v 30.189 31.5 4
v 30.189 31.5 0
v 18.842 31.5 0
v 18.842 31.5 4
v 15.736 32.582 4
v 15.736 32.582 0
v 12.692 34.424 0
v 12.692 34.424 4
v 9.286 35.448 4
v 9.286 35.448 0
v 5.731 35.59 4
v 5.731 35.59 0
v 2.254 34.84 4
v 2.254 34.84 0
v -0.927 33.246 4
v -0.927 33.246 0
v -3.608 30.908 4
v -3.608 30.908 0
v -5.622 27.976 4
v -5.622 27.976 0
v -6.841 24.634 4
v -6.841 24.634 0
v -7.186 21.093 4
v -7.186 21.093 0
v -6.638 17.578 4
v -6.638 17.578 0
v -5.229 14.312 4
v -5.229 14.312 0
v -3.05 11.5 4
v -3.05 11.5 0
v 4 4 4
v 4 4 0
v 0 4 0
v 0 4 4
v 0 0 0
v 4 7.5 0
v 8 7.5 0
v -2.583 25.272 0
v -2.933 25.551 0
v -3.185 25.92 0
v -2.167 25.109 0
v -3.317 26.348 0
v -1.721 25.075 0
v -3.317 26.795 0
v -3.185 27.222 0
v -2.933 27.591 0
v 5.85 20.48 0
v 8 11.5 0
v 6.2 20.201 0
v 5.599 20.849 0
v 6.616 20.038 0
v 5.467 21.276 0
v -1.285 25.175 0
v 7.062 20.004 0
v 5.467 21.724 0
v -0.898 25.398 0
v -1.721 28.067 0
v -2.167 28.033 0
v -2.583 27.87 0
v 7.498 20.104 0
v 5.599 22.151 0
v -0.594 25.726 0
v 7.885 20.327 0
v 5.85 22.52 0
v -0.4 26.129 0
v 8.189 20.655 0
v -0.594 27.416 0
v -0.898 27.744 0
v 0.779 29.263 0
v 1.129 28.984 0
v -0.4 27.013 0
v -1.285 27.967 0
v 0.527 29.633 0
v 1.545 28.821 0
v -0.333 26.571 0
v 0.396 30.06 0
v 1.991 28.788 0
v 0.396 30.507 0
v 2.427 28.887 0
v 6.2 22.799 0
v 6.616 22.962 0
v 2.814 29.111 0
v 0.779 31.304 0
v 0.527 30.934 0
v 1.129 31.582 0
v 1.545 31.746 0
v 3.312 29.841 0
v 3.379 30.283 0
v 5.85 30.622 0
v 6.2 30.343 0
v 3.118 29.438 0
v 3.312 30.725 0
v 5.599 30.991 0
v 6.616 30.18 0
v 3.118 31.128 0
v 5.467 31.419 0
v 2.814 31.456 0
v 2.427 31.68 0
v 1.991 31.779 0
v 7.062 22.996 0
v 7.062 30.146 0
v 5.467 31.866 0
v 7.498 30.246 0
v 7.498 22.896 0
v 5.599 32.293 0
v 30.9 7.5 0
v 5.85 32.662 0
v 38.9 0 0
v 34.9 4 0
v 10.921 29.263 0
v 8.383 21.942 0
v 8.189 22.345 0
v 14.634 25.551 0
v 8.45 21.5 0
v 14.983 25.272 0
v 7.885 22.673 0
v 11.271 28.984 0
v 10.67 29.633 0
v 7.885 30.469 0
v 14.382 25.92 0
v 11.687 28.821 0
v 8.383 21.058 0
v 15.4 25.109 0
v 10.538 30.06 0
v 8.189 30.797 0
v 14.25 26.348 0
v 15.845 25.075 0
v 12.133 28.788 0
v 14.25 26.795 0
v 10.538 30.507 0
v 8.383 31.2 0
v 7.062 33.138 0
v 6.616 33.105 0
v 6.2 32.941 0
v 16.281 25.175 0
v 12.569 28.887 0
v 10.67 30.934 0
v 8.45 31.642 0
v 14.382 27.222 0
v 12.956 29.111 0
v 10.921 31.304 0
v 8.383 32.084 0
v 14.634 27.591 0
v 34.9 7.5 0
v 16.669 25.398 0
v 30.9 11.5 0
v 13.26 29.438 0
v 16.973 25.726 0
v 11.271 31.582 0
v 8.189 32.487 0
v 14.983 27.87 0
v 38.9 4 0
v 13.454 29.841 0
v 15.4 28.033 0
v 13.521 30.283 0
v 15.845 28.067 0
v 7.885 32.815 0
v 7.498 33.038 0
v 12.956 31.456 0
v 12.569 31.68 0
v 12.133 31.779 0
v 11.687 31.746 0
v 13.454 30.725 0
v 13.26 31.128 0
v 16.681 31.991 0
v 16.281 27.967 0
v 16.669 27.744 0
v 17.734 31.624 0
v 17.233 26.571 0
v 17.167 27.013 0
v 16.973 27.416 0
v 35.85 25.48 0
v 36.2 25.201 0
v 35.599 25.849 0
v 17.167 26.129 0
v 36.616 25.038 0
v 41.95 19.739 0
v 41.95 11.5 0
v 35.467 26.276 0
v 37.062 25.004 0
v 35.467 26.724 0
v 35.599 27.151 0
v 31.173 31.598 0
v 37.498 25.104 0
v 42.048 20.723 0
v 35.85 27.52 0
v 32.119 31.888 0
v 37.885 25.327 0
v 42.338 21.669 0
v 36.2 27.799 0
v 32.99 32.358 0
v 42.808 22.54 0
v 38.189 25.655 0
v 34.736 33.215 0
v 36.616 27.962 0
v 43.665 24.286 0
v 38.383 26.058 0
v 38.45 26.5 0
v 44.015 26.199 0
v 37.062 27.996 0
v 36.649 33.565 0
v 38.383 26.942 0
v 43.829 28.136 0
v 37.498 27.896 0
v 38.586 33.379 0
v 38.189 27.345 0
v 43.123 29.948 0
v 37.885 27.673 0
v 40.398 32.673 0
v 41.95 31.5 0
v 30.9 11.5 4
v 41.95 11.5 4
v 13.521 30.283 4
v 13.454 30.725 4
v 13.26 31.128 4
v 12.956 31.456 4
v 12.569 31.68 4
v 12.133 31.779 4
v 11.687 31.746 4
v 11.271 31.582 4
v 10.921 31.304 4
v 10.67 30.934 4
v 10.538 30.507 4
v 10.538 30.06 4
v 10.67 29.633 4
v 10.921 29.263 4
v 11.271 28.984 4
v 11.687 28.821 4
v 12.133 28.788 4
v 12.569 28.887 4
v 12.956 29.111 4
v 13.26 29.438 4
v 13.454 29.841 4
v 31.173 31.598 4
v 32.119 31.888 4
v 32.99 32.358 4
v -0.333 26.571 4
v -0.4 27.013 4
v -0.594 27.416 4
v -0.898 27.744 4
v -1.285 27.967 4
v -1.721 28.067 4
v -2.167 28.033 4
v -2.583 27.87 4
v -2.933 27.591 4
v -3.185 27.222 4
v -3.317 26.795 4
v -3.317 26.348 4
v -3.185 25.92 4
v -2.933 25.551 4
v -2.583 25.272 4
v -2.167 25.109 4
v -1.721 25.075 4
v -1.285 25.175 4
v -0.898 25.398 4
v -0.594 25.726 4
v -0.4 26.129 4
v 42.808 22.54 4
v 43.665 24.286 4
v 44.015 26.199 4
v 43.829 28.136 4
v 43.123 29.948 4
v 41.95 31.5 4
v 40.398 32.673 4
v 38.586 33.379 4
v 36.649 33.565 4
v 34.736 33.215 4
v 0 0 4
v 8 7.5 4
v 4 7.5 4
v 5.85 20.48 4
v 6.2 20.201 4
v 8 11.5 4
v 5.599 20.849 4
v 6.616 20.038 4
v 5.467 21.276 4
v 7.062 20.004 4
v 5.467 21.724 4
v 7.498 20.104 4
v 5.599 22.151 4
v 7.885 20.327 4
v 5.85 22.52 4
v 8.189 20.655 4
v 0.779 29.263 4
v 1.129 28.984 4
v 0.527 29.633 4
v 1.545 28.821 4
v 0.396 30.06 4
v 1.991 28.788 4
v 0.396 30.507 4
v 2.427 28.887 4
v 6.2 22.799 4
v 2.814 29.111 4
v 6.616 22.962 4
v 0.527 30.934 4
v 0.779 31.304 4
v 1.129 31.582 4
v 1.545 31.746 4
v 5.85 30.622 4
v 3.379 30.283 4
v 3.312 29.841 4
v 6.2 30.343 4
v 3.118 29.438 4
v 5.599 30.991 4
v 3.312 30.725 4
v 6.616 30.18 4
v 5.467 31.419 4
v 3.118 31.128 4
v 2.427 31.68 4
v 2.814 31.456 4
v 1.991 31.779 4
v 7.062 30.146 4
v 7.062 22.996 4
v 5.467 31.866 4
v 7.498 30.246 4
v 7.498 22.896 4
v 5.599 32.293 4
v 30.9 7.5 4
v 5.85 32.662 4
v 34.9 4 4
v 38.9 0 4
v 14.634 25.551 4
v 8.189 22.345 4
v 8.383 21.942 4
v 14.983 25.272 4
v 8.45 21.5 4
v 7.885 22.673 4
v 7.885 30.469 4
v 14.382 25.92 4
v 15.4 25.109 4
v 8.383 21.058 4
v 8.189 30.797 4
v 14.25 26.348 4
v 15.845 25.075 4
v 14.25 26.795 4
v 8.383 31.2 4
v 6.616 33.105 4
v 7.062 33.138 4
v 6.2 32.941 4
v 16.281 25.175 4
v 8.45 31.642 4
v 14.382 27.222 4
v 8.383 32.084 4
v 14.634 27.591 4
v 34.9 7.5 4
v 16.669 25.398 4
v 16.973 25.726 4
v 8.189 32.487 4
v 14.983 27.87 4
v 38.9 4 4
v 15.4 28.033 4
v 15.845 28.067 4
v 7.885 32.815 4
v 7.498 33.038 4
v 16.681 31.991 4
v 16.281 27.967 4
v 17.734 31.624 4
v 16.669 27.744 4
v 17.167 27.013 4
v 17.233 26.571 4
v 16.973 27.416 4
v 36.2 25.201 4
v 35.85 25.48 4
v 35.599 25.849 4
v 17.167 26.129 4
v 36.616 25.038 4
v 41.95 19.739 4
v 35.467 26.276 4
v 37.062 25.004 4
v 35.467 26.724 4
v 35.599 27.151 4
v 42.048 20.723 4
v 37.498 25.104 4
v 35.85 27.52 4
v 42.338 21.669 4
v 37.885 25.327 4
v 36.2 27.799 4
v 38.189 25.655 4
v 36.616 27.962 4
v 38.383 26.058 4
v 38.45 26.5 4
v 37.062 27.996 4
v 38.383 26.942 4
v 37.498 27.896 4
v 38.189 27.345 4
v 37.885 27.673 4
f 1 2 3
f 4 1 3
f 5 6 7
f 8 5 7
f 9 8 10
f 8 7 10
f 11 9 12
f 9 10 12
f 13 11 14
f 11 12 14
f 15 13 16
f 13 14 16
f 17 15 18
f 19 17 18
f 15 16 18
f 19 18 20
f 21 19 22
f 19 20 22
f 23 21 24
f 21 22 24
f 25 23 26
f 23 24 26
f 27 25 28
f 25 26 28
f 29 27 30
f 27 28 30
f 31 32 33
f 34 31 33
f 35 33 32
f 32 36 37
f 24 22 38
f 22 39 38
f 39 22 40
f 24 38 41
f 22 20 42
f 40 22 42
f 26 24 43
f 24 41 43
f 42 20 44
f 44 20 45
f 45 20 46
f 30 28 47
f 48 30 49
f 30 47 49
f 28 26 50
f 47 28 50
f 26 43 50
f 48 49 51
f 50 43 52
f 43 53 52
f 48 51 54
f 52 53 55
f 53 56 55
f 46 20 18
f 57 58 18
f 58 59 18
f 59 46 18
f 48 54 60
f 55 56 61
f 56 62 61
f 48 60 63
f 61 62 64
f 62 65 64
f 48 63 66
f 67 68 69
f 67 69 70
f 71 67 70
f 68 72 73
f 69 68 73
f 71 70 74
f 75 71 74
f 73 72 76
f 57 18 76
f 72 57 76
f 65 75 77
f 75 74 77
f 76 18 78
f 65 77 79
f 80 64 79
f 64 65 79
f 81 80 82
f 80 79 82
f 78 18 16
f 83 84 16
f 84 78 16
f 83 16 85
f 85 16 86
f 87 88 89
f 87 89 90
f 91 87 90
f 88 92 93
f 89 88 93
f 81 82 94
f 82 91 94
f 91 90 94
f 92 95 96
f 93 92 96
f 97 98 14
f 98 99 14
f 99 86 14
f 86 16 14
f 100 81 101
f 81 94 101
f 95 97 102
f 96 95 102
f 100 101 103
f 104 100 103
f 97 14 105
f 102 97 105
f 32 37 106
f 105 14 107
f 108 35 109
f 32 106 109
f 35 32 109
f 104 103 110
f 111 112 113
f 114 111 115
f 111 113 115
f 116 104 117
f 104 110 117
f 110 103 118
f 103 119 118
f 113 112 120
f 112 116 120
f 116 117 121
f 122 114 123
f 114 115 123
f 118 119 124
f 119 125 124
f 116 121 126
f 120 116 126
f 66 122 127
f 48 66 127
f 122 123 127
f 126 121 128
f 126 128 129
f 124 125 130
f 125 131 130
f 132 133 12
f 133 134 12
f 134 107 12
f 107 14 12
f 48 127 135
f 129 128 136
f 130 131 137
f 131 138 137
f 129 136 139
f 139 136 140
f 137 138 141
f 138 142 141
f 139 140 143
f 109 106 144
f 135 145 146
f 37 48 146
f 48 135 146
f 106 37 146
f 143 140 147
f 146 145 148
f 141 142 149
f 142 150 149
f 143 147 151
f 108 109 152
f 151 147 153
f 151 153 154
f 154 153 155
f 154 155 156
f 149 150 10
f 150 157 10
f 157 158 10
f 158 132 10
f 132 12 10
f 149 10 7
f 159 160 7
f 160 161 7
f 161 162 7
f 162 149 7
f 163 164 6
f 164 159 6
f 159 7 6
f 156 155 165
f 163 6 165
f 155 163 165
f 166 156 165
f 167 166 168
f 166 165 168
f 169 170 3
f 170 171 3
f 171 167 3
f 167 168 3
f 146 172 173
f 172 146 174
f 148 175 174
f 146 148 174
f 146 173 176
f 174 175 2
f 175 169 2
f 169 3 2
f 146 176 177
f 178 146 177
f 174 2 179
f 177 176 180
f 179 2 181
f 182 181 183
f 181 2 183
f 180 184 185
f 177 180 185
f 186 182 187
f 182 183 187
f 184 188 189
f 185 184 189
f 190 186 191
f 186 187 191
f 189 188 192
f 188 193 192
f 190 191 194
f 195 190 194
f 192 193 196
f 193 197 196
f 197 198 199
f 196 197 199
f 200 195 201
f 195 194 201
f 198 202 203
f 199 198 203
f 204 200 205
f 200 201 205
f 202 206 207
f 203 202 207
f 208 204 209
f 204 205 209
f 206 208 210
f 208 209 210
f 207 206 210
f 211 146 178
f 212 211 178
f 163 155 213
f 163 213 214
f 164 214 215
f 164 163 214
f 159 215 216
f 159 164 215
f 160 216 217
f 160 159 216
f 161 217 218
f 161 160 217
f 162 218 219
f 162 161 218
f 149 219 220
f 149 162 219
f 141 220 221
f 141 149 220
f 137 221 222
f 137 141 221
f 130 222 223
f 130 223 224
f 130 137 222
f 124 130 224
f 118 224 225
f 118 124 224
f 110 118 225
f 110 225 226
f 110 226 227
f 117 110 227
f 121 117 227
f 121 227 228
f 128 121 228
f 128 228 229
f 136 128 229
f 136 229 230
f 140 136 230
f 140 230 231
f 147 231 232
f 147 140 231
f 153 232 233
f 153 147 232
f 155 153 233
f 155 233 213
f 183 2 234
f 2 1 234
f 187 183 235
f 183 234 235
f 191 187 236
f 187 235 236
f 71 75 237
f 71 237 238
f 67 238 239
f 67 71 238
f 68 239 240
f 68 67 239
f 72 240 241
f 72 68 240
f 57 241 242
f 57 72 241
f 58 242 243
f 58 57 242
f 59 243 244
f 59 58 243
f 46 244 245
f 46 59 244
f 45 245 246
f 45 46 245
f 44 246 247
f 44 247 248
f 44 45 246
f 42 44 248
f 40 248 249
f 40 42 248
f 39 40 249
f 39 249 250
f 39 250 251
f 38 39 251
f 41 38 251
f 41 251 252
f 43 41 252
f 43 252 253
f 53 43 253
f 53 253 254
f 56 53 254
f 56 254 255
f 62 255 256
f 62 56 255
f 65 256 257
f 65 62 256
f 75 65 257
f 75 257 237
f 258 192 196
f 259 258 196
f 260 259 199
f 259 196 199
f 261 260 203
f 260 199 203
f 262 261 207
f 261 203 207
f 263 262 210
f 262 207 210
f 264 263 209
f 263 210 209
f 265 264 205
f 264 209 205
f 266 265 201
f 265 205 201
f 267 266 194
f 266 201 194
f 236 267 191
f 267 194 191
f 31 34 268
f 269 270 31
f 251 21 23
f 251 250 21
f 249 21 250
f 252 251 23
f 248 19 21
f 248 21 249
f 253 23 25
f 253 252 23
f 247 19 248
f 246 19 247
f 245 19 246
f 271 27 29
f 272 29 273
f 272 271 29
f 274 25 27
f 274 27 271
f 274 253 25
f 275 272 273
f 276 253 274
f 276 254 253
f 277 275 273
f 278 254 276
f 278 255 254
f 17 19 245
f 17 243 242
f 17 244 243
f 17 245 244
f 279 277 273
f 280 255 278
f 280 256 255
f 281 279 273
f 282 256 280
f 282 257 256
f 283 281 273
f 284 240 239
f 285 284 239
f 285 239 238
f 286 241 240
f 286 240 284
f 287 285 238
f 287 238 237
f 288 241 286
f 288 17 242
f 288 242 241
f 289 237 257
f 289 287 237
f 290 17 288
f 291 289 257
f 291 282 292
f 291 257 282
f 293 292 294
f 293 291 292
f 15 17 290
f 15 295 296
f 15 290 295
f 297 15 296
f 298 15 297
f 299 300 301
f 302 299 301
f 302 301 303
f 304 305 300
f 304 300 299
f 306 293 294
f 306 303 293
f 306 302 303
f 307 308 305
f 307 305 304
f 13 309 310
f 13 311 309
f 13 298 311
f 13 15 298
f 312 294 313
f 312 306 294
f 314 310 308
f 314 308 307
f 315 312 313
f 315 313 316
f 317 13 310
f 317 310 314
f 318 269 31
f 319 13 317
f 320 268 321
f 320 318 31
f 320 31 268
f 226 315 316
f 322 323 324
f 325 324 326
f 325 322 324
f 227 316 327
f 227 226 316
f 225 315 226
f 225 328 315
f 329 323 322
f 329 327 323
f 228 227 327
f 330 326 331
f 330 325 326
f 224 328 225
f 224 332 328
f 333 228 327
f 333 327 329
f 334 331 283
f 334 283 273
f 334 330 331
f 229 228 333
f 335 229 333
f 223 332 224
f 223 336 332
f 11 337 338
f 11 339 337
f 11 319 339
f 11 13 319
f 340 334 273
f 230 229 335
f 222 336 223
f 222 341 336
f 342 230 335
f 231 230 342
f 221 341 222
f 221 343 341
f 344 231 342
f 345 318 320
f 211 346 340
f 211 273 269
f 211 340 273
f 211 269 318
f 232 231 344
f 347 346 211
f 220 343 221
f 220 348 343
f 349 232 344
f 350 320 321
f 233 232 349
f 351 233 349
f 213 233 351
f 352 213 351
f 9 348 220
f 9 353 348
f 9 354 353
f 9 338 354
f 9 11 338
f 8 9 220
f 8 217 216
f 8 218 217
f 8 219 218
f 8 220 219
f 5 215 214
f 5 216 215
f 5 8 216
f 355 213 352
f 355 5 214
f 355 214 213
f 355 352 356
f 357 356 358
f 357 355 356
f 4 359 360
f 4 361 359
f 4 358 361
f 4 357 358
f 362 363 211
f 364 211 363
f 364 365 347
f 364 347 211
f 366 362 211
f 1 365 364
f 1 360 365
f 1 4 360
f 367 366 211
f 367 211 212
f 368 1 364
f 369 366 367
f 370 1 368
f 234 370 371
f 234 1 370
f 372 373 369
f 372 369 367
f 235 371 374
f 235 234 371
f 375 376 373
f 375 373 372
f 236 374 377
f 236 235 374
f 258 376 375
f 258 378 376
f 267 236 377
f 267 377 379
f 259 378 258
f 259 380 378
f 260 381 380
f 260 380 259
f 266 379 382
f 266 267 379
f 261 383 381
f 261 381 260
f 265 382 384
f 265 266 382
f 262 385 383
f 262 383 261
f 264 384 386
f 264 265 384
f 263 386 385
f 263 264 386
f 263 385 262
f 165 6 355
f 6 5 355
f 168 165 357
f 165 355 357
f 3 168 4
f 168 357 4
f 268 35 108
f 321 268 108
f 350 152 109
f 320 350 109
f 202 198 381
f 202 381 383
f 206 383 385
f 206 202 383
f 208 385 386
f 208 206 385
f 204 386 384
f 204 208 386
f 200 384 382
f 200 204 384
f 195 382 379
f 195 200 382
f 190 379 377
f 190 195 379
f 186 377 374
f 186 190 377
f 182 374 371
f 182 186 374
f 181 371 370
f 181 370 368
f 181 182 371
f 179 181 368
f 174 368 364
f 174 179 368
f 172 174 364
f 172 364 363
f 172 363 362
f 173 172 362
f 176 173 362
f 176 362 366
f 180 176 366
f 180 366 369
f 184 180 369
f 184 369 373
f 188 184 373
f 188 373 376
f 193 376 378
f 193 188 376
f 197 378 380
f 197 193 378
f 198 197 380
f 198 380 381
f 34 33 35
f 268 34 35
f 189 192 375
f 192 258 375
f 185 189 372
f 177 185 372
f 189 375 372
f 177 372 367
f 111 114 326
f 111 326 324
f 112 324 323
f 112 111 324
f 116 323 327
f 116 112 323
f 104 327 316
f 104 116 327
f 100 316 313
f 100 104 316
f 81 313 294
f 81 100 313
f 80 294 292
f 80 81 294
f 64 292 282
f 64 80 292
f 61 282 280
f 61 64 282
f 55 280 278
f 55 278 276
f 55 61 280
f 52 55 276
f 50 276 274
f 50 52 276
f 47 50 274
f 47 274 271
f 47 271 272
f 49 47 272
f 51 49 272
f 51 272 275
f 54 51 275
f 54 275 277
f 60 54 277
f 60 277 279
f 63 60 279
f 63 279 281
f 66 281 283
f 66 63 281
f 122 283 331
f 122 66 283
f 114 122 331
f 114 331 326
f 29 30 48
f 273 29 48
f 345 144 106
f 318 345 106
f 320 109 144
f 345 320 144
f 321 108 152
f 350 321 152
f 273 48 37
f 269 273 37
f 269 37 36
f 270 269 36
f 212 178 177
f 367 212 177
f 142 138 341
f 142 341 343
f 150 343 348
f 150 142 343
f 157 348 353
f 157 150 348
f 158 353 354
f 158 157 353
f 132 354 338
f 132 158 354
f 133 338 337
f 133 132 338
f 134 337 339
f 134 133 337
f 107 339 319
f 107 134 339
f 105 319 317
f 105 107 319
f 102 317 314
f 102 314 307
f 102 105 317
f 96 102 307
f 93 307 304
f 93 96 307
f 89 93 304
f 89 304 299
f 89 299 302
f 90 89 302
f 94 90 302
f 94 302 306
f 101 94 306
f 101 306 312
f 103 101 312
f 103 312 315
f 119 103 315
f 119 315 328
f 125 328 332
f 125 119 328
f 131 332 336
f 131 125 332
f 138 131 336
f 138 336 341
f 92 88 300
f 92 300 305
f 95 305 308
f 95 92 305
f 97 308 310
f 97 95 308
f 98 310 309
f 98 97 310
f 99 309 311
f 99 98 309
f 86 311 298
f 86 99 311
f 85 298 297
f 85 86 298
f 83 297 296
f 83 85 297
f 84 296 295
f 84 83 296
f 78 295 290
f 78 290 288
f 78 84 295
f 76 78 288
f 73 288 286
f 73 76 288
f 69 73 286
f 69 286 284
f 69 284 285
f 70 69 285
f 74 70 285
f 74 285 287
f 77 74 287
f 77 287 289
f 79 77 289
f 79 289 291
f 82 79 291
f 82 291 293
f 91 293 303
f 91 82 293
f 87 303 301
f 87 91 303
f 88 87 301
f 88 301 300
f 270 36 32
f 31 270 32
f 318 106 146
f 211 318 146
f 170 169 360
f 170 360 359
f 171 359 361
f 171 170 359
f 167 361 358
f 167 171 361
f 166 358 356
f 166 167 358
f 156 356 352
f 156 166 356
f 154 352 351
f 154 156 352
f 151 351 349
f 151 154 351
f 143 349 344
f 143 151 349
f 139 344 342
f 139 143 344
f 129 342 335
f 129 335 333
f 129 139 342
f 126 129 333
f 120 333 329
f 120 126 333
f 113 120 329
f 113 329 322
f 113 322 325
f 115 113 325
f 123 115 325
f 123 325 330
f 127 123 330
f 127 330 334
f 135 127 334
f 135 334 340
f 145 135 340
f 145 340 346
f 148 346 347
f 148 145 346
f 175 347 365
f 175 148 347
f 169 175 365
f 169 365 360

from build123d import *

# Parameters (mm, degrees)
SKETCH2_R           = 1.5
BOSS_EXTRUDE1_DEPTH = 4
FILLET1_R           = 5


with BuildPart() as part:
    # Sketch2 → Boss-Extrude1 (new body)
    with BuildSketch(Plane.XY):
        with BuildLine():
            Line((0, 4), (0, 0))
            Line((0, 0), (38.9, 0))
            Line((38.9, 0), (38.9, 4))
            Line((38.9, 4), (34.9, 4))
            Line((34.9, 4), (34.9, 7.5))
            Line((34.9, 7.5), (30.9, 7.5))
            Line((30.9, 7.5), (30.9, 11.5))
            Line((30.9, 11.5), (41.95, 11.5))
            Line((41.95, 11.5), (41.95, 21.5))
            ThreePointArc((41.95, 21.5), (41.95, 31.5), (31.95, 31.5))
            Line((31.95, 31.5), (16.95, 31.5))
            ThreePointArc((16.95, 31.5), (-3.05, 31.5), (-3.05, 11.5))
            Line((-3.05, 11.5), (8, 11.5))
            Line((8, 11.5), (8, 7.5))
            Line((8, 7.5), (4, 7.5))
            Line((4, 7.5), (4, 4))
            Line((4, 4), (0, 4))
        make_face()
        with Locations((12.021067812, 30.283347099)):
            Circle(SKETCH2_R, mode=Mode.SUBTRACT)
        with Locations((6.95, 31.642135624)):
            Circle(SKETCH2_R, mode=Mode.SUBTRACT)
        with Locations((1.878932188, 30.283347099)):
            Circle(SKETCH2_R, mode=Mode.SUBTRACT)
        with Locations((-1.833347099, 26.571067812)):
            Circle(SKETCH2_R, mode=Mode.SUBTRACT)
        with Locations((15.733347099, 26.571067812)):
            Circle(SKETCH2_R, mode=Mode.SUBTRACT)
        with Locations((6.95, 21.5)):
            Circle(SKETCH2_R, mode=Mode.SUBTRACT)
        with Locations((36.95, 26.5)):
            Circle(SKETCH2_R, mode=Mode.SUBTRACT)
    extrude(amount=BOSS_EXTRUDE1_DEPTH)

    # Fillet1
    fillet1_edges = [part.edges().sort_by_distance(p)[0] for p in [
        (16.95, 31.5, 2),
        (31.95, 31.5, 2),
        (41.95, 21.5, 2),
    ]]
    fillet(fillet1_edges, radius=FILLET1_R)


solid = part.part
